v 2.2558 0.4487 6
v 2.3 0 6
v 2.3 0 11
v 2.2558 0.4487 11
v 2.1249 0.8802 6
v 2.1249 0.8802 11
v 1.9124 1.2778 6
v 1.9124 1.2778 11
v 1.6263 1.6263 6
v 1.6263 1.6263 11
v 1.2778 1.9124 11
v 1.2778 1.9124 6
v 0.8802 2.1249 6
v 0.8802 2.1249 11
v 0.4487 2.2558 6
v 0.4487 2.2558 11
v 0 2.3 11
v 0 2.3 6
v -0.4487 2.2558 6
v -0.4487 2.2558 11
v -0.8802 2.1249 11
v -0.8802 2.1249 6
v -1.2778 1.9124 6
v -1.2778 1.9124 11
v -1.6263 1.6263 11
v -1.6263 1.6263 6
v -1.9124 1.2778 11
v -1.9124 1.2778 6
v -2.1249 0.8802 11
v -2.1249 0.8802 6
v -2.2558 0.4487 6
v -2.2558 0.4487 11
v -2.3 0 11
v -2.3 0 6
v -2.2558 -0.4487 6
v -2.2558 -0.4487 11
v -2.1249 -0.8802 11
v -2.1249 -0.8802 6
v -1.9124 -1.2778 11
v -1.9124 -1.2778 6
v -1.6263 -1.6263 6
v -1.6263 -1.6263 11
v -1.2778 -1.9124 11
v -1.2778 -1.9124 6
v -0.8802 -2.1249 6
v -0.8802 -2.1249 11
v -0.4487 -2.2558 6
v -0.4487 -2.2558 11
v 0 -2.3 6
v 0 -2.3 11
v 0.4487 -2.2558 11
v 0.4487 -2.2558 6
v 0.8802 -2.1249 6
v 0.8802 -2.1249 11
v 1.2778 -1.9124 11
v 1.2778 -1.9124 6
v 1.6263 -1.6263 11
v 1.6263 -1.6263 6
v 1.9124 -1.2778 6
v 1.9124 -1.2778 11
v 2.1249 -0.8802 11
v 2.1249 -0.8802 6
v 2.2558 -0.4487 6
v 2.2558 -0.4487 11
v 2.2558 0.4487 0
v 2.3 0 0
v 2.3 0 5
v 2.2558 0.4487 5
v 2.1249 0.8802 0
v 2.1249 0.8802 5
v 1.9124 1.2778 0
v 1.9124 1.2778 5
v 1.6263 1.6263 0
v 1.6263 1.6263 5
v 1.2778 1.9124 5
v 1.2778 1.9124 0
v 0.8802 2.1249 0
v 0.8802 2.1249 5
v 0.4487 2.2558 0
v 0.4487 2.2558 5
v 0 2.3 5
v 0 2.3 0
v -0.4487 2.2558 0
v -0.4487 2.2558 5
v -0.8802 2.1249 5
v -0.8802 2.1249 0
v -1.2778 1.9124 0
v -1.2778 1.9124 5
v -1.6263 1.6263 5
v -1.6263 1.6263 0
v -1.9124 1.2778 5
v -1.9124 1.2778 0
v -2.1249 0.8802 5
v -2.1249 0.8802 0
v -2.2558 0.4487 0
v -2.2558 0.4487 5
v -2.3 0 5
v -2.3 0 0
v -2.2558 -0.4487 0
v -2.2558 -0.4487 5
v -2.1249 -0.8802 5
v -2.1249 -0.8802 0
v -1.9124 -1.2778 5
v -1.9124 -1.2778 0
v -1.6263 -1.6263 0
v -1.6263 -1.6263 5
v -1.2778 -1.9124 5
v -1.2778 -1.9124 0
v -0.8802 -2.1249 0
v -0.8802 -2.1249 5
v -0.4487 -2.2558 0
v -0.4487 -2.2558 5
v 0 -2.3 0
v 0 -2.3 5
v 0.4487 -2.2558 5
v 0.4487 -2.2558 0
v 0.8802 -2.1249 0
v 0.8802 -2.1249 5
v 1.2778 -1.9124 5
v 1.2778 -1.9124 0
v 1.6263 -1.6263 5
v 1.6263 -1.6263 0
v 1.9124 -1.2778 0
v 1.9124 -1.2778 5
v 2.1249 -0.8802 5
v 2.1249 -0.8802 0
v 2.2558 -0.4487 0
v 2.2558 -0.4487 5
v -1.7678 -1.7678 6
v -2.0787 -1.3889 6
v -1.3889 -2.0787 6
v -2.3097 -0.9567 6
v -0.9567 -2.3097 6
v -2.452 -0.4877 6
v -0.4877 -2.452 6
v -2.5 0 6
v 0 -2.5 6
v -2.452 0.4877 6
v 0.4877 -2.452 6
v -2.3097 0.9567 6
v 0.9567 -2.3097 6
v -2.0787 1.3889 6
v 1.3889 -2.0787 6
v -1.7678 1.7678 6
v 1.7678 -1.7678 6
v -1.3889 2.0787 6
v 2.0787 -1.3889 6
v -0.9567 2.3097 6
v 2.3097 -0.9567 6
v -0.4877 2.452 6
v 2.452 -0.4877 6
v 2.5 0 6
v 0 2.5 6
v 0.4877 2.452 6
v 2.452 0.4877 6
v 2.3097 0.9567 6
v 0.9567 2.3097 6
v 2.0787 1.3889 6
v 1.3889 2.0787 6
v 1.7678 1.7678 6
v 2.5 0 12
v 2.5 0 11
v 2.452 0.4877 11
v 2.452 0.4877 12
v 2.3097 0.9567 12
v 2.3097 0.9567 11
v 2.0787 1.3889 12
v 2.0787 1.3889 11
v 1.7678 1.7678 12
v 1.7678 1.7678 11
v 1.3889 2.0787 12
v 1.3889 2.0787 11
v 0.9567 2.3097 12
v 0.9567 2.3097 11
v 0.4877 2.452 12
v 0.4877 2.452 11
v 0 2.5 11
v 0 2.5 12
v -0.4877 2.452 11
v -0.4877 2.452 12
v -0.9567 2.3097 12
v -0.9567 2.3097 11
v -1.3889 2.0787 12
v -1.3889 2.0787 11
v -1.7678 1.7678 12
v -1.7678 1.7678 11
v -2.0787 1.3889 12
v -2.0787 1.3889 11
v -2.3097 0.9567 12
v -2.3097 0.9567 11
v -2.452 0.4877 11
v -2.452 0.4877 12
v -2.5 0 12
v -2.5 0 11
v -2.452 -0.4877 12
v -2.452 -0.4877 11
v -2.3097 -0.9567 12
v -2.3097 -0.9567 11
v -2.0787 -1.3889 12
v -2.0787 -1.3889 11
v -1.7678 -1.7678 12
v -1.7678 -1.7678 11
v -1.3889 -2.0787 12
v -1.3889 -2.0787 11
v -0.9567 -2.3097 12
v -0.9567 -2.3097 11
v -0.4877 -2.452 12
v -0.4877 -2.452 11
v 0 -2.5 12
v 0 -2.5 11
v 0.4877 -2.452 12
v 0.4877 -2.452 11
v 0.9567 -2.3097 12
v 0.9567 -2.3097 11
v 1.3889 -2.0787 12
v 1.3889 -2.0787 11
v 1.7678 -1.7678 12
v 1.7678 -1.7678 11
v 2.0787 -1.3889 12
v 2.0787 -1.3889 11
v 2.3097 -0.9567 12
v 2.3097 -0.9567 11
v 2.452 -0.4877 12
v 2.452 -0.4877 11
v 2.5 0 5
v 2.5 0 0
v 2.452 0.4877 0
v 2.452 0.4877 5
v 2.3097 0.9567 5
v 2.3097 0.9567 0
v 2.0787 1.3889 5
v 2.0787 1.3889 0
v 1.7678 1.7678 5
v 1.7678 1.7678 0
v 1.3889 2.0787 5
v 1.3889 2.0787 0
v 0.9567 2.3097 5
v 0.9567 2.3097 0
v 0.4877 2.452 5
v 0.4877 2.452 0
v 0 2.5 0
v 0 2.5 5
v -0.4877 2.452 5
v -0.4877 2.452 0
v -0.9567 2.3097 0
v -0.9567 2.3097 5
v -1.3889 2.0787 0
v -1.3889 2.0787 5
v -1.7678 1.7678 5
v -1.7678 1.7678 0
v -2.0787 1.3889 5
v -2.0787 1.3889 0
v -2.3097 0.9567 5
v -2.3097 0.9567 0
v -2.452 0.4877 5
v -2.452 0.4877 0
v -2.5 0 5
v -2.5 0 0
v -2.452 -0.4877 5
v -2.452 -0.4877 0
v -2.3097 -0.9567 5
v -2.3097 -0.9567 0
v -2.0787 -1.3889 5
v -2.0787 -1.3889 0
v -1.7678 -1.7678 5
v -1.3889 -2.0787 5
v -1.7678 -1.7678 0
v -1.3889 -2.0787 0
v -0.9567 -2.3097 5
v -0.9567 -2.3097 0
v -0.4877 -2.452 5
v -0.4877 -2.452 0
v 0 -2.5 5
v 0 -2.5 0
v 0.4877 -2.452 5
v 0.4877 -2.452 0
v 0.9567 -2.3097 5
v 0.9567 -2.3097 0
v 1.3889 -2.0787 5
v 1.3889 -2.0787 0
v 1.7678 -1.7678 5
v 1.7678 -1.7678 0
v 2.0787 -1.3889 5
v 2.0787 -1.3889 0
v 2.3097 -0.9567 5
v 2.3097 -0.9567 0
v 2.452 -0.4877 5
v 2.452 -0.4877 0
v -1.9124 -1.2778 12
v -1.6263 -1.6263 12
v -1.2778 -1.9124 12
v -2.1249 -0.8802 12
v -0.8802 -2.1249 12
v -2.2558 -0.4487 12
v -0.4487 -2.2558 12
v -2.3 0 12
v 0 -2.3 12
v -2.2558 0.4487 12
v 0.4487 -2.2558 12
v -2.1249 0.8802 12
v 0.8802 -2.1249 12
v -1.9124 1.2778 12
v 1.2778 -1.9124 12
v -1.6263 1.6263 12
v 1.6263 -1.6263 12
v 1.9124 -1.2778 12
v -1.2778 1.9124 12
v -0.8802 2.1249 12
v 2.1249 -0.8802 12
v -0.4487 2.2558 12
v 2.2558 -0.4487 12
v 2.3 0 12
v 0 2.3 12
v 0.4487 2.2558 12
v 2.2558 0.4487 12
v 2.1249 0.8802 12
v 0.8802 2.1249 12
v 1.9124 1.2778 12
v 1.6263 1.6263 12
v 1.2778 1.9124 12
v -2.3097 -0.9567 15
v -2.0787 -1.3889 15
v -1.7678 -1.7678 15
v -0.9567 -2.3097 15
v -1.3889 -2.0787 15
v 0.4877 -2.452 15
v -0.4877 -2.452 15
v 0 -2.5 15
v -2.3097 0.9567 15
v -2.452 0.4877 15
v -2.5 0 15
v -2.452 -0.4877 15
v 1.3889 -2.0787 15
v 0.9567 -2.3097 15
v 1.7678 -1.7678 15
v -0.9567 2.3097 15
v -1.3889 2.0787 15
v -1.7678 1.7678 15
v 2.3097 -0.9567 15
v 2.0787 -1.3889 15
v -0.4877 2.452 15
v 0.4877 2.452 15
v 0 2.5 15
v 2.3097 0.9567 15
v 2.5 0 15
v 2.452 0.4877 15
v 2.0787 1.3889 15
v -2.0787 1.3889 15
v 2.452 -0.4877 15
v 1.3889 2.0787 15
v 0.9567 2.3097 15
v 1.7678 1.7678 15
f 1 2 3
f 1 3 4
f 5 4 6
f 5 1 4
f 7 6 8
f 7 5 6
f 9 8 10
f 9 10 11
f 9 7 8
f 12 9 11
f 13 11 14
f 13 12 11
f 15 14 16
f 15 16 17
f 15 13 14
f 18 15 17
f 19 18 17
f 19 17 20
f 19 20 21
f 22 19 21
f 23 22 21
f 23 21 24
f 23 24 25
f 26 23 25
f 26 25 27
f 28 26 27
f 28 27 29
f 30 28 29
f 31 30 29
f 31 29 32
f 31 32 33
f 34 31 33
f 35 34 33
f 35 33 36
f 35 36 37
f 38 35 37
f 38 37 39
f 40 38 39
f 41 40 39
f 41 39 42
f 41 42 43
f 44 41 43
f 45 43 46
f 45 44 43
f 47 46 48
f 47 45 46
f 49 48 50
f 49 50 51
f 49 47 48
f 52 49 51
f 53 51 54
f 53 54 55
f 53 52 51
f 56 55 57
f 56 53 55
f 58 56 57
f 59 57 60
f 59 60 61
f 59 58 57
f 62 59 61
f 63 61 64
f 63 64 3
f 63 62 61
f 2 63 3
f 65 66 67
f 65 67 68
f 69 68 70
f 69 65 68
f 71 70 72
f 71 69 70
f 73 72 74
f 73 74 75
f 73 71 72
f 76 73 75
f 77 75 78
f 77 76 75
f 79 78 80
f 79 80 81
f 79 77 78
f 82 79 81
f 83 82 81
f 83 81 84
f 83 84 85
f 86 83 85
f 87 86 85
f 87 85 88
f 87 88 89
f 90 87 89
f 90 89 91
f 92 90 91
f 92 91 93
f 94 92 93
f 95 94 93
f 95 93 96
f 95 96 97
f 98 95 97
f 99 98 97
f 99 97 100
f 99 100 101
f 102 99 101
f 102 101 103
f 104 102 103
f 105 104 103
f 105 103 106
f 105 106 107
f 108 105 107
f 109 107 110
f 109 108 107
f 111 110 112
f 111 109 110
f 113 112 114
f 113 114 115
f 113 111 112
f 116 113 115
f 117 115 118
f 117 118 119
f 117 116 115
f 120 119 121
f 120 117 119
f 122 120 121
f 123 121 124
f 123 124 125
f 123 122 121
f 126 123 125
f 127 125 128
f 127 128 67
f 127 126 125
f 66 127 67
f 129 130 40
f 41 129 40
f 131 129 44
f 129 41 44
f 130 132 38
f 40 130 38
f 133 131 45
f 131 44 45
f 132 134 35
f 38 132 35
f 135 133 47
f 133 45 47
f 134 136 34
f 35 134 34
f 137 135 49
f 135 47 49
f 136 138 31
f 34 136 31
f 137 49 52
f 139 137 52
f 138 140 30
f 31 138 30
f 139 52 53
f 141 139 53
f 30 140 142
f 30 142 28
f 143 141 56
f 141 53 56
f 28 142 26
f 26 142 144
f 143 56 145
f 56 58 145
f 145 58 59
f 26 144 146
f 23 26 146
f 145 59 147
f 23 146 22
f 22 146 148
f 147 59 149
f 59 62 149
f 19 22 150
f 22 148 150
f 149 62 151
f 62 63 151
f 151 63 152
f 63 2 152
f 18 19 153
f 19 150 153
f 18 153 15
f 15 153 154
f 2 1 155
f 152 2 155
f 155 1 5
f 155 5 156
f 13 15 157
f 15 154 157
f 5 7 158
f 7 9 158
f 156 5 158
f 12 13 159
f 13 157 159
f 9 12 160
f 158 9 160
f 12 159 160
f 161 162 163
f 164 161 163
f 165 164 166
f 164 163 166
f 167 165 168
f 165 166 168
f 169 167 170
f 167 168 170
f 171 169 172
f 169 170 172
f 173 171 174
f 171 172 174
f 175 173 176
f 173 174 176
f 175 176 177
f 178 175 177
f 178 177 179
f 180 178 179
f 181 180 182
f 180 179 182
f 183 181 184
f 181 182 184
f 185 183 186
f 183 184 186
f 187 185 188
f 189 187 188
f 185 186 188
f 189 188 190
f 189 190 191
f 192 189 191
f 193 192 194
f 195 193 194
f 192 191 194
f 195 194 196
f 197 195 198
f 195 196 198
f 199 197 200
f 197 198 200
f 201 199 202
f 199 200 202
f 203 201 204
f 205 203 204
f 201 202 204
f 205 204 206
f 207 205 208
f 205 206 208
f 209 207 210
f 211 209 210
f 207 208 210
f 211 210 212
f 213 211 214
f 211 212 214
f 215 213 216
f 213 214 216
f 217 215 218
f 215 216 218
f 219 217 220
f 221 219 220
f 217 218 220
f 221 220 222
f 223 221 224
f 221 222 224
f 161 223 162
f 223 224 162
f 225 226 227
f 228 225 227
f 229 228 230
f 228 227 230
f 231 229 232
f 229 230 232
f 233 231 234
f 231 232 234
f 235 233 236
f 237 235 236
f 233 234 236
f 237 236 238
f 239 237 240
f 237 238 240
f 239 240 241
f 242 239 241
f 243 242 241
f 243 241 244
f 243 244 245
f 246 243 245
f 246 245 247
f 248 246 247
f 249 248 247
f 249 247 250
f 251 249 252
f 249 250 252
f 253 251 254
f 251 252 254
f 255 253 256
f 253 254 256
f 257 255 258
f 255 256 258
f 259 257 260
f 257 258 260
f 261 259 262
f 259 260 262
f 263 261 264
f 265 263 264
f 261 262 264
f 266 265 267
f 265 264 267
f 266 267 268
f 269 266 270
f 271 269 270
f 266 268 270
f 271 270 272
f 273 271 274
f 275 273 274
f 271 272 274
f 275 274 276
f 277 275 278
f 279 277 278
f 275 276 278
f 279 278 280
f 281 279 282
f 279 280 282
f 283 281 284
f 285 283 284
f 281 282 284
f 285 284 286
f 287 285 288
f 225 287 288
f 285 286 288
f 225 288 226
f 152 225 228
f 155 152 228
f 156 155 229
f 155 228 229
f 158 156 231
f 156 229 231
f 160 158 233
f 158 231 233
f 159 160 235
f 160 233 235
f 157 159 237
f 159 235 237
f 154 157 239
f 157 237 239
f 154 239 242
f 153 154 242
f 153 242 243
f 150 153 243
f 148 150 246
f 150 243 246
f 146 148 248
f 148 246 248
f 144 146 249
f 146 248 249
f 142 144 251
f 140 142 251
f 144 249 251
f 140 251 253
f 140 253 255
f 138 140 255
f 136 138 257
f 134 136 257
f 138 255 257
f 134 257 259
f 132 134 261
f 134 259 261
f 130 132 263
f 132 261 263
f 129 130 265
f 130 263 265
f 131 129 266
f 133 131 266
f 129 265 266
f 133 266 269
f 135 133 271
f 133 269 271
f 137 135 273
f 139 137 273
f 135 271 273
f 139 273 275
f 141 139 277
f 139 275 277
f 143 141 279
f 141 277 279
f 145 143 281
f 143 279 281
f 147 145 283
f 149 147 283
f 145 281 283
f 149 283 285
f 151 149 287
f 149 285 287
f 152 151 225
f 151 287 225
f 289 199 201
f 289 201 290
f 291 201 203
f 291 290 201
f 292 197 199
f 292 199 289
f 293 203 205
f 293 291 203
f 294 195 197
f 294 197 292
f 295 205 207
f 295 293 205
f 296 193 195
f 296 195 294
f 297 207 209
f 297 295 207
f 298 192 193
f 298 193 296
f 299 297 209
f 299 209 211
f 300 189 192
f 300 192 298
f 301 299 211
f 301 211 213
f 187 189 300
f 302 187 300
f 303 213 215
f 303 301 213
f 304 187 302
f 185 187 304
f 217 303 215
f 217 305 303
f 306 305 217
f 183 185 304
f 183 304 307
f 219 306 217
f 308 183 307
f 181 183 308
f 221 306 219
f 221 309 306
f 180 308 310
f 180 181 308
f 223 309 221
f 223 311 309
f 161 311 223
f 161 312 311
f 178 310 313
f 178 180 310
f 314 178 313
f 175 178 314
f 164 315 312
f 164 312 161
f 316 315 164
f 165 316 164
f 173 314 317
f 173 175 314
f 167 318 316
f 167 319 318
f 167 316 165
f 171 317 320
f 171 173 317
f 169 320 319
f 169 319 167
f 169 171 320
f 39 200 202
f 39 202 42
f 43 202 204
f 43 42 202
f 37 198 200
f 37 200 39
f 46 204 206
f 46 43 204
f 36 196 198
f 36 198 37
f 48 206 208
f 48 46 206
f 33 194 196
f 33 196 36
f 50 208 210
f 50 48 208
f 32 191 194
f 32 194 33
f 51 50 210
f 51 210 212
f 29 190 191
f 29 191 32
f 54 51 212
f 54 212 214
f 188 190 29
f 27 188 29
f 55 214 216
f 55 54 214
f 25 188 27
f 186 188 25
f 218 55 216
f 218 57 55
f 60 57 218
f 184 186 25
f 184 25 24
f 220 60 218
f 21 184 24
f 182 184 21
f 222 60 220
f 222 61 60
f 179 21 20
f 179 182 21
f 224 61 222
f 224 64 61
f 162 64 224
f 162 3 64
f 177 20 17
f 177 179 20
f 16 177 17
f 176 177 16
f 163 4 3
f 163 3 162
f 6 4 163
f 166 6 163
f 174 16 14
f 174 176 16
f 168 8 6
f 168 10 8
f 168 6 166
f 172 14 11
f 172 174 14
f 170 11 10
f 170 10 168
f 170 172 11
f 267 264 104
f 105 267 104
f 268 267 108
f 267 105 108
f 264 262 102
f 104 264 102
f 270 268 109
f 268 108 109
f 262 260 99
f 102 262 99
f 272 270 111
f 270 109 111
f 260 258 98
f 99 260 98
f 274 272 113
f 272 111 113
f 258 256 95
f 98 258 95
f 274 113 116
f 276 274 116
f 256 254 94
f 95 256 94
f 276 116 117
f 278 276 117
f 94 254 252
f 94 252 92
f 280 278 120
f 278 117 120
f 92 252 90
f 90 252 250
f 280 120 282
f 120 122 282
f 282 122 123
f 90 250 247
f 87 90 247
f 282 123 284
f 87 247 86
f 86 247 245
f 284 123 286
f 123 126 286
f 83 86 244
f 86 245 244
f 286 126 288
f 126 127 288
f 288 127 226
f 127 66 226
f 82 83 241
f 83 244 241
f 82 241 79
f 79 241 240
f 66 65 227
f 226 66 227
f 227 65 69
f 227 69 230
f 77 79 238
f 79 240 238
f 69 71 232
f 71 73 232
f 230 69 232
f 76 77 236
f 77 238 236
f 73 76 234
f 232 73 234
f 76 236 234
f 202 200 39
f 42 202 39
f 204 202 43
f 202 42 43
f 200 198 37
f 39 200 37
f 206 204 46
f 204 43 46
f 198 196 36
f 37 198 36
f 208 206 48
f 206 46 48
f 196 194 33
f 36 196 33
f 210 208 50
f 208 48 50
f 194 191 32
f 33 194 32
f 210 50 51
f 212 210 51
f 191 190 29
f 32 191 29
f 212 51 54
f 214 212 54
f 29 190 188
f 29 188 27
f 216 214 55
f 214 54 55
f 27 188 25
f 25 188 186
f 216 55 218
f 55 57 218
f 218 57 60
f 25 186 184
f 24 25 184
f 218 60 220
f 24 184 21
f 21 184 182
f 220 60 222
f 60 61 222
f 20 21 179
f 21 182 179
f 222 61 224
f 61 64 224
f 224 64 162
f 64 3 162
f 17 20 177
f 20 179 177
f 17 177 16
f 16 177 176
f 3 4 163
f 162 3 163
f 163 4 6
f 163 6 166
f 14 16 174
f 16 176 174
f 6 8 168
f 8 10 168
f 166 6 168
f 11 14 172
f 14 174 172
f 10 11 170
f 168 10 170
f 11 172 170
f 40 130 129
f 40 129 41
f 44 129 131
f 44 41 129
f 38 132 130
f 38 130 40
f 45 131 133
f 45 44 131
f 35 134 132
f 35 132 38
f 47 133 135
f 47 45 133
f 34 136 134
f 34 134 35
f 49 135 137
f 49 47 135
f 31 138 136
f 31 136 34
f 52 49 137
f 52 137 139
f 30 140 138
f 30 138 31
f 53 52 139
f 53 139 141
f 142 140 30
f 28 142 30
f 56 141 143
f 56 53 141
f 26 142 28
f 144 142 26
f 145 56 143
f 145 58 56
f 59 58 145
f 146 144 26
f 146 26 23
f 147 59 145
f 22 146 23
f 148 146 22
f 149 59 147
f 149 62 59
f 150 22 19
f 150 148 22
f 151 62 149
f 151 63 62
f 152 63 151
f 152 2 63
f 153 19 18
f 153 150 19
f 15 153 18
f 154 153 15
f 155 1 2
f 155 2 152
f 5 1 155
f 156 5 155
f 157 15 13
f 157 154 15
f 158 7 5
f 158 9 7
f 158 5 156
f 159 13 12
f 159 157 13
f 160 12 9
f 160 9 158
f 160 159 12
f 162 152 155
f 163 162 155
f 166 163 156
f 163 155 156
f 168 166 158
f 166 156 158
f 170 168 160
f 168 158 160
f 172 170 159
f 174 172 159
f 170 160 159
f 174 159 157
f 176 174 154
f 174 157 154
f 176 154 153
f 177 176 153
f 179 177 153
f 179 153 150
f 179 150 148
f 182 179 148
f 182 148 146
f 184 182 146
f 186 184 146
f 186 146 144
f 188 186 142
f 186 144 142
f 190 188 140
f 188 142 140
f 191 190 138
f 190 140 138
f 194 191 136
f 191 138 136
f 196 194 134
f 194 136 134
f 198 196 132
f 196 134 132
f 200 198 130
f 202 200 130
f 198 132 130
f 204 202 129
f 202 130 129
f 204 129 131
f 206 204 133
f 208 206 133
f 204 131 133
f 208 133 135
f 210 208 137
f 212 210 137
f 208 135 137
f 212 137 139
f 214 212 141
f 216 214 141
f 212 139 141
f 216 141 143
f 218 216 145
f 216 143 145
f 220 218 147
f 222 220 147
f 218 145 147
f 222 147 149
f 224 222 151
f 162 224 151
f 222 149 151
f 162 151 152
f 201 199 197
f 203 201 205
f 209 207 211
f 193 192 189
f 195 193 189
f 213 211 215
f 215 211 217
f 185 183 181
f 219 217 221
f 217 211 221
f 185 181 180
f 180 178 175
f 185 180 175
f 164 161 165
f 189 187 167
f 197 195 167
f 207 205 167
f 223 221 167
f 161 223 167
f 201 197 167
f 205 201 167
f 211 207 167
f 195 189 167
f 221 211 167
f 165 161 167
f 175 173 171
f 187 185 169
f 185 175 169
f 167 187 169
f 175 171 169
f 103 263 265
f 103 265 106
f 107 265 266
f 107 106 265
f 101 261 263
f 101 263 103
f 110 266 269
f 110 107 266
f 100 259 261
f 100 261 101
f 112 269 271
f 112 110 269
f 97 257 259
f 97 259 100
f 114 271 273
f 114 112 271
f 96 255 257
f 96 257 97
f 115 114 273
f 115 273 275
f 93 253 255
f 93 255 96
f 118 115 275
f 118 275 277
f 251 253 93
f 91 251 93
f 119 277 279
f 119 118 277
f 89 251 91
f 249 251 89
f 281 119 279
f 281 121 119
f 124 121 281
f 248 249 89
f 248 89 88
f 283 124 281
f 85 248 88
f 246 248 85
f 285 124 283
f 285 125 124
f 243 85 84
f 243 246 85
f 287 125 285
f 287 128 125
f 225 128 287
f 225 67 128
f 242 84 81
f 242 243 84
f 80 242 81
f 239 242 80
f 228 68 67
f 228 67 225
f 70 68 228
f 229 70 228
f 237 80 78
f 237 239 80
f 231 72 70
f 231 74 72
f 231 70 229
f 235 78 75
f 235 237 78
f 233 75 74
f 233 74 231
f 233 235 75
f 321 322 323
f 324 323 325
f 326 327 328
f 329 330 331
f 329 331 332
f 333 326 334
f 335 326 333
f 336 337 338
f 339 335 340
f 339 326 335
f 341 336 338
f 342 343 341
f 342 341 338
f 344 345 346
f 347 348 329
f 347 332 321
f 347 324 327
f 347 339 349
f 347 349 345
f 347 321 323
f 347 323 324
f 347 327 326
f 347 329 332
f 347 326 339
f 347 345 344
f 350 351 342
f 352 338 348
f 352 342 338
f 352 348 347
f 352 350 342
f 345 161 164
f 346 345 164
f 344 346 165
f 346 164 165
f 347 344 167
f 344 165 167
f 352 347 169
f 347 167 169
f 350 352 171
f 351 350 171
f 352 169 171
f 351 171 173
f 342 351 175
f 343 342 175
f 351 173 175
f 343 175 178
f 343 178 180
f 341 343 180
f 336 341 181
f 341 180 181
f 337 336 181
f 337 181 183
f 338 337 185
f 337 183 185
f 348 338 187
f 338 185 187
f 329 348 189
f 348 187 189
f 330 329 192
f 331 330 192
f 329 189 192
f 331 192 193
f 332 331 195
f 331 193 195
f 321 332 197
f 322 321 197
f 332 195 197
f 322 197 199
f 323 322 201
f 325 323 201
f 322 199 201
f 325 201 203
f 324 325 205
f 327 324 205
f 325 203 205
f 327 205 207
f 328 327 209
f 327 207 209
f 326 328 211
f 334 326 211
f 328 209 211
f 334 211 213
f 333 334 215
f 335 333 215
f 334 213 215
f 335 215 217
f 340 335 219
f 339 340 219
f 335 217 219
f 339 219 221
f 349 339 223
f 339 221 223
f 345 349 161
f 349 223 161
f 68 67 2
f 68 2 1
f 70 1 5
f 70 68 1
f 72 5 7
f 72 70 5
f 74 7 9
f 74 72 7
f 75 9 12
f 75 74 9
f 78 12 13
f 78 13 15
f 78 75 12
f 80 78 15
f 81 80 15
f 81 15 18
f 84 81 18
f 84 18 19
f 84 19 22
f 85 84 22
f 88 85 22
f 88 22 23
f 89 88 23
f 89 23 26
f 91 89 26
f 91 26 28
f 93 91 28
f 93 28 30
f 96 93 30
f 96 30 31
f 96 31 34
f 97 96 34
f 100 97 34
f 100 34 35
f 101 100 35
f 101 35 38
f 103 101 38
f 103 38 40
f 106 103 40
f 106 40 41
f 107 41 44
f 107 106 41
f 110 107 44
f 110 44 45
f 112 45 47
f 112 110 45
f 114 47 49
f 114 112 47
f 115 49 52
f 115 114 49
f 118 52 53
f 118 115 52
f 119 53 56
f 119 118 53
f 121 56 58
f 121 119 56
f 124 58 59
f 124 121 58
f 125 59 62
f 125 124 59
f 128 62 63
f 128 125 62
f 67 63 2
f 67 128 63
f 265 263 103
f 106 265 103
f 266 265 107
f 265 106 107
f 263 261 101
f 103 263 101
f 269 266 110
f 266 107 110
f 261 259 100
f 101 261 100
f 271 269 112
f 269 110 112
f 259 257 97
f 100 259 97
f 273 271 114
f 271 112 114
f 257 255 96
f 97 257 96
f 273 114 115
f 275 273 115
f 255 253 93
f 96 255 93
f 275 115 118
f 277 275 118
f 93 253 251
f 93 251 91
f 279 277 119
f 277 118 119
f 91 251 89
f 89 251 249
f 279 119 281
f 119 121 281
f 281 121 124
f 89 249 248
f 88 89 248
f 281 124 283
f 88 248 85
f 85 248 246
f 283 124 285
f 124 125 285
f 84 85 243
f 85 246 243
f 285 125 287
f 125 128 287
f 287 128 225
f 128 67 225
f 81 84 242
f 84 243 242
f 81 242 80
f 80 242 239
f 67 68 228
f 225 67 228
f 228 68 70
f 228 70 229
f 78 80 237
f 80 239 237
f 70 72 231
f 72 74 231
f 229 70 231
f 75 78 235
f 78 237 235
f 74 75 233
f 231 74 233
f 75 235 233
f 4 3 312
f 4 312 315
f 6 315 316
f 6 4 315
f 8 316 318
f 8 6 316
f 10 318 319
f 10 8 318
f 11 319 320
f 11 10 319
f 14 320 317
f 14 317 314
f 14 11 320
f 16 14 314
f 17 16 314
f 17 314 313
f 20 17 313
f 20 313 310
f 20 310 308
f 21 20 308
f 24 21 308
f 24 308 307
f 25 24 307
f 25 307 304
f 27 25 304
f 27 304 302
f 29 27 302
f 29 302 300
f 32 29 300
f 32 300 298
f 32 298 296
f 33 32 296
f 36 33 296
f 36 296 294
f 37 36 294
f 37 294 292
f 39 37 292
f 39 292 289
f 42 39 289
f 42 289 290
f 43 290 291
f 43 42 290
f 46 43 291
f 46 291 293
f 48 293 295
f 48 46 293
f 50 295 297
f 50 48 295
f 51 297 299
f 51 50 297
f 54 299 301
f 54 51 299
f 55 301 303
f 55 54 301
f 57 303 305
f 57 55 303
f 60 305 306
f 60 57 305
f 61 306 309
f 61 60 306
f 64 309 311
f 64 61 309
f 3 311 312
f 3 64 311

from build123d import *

# Parameters (mm, degrees)
F0_R     = 2.5
F0_R_2   = 2.4
F1_DEPTH = 5
F2_DEPTH = 1
F3_DEPTH = 5
F4_DEPTH = 1
F5_DEPTH = 3
F6_T     = -0.2
F6_2_T   = -0.2
F6_3_T   = -0.2
F6_4_T   = -0.2


with BuildPart() as f1:
    # F0 (on Top) → F1 (new body)
    with BuildSketch(Plane.XY):
        Circle(F0_R)
        Circle(F0_R_2, mode=Mode.SUBTRACT)
        Circle(F0_R_2)
    extrude(amount=F1_DEPTH)


with BuildPart() as f2:
    # F2 (new): a face of the model
    f2_faces = [f1.part.faces().sort_by_distance(p)[0] for p in [
        (0, 0, 5),
    ]]
    extrude(f2_faces, amount=F2_DEPTH)


with BuildPart() as f3:
    # F3 (new): a face of the model
    f3_faces = [f2.part.faces().sort_by_distance(p)[0] for p in [
        (0, 0, 6),
    ]]
    extrude(f3_faces, amount=F3_DEPTH)


with BuildPart() as f4:
    # F4 (new): a face of the model
    f4_faces = [f3.part.faces().sort_by_distance(p)[0] for p in [
        (0, 0, 11),
    ]]
    extrude(f4_faces, amount=F4_DEPTH)


with BuildPart() as f5:
    # F5 (new): a face of the model
    f5_faces = [f4.part.faces().sort_by_distance(p)[0] for p in [
        (0, 0, 12),
    ]]
    extrude(f5_faces, amount=F5_DEPTH)


with BuildPart() as f1_1:
    add(f1.part)

    # F6
    f6_openings = [f1_1.faces().sort_by_distance(p)[0] for p in [
        (0, 0, 0),
        (0, 0, 5),
    ]]
    offset(amount=F6_T, openings=f6_openings)


with BuildPart() as f2_1:
    add(f2.part)

    # F6#2
    f6_2_openings = [f2_1.faces().sort_by_distance(p)[0] for p in [
        (0, 0, 5),
        (0, 0, 6),
    ]]
    offset(amount=F6_2_T, openings=f6_2_openings)


with BuildPart() as f4_1:
    add(f4.part)

    # F6#3
    f6_3_openings = [f4_1.faces().sort_by_distance(p)[0] for p in [
        (0, 0, 11),
        (0, 0, 12),
    ]]
    offset(amount=F6_3_T, openings=f6_3_openings)


with BuildPart() as f3_1:
    add(f3.part)

    # F6#4
    f6_4_openings = [f3_1.faces().sort_by_distance(p)[0] for p in [
        (0, 0, 11),
        (0, 0, 6),
    ]]
    offset(amount=F6_4_T, openings=f6_4_openings)


solid = Compound([f5.part, f1_1.part, f2_1.part, f4_1.part, f3_1.part])
